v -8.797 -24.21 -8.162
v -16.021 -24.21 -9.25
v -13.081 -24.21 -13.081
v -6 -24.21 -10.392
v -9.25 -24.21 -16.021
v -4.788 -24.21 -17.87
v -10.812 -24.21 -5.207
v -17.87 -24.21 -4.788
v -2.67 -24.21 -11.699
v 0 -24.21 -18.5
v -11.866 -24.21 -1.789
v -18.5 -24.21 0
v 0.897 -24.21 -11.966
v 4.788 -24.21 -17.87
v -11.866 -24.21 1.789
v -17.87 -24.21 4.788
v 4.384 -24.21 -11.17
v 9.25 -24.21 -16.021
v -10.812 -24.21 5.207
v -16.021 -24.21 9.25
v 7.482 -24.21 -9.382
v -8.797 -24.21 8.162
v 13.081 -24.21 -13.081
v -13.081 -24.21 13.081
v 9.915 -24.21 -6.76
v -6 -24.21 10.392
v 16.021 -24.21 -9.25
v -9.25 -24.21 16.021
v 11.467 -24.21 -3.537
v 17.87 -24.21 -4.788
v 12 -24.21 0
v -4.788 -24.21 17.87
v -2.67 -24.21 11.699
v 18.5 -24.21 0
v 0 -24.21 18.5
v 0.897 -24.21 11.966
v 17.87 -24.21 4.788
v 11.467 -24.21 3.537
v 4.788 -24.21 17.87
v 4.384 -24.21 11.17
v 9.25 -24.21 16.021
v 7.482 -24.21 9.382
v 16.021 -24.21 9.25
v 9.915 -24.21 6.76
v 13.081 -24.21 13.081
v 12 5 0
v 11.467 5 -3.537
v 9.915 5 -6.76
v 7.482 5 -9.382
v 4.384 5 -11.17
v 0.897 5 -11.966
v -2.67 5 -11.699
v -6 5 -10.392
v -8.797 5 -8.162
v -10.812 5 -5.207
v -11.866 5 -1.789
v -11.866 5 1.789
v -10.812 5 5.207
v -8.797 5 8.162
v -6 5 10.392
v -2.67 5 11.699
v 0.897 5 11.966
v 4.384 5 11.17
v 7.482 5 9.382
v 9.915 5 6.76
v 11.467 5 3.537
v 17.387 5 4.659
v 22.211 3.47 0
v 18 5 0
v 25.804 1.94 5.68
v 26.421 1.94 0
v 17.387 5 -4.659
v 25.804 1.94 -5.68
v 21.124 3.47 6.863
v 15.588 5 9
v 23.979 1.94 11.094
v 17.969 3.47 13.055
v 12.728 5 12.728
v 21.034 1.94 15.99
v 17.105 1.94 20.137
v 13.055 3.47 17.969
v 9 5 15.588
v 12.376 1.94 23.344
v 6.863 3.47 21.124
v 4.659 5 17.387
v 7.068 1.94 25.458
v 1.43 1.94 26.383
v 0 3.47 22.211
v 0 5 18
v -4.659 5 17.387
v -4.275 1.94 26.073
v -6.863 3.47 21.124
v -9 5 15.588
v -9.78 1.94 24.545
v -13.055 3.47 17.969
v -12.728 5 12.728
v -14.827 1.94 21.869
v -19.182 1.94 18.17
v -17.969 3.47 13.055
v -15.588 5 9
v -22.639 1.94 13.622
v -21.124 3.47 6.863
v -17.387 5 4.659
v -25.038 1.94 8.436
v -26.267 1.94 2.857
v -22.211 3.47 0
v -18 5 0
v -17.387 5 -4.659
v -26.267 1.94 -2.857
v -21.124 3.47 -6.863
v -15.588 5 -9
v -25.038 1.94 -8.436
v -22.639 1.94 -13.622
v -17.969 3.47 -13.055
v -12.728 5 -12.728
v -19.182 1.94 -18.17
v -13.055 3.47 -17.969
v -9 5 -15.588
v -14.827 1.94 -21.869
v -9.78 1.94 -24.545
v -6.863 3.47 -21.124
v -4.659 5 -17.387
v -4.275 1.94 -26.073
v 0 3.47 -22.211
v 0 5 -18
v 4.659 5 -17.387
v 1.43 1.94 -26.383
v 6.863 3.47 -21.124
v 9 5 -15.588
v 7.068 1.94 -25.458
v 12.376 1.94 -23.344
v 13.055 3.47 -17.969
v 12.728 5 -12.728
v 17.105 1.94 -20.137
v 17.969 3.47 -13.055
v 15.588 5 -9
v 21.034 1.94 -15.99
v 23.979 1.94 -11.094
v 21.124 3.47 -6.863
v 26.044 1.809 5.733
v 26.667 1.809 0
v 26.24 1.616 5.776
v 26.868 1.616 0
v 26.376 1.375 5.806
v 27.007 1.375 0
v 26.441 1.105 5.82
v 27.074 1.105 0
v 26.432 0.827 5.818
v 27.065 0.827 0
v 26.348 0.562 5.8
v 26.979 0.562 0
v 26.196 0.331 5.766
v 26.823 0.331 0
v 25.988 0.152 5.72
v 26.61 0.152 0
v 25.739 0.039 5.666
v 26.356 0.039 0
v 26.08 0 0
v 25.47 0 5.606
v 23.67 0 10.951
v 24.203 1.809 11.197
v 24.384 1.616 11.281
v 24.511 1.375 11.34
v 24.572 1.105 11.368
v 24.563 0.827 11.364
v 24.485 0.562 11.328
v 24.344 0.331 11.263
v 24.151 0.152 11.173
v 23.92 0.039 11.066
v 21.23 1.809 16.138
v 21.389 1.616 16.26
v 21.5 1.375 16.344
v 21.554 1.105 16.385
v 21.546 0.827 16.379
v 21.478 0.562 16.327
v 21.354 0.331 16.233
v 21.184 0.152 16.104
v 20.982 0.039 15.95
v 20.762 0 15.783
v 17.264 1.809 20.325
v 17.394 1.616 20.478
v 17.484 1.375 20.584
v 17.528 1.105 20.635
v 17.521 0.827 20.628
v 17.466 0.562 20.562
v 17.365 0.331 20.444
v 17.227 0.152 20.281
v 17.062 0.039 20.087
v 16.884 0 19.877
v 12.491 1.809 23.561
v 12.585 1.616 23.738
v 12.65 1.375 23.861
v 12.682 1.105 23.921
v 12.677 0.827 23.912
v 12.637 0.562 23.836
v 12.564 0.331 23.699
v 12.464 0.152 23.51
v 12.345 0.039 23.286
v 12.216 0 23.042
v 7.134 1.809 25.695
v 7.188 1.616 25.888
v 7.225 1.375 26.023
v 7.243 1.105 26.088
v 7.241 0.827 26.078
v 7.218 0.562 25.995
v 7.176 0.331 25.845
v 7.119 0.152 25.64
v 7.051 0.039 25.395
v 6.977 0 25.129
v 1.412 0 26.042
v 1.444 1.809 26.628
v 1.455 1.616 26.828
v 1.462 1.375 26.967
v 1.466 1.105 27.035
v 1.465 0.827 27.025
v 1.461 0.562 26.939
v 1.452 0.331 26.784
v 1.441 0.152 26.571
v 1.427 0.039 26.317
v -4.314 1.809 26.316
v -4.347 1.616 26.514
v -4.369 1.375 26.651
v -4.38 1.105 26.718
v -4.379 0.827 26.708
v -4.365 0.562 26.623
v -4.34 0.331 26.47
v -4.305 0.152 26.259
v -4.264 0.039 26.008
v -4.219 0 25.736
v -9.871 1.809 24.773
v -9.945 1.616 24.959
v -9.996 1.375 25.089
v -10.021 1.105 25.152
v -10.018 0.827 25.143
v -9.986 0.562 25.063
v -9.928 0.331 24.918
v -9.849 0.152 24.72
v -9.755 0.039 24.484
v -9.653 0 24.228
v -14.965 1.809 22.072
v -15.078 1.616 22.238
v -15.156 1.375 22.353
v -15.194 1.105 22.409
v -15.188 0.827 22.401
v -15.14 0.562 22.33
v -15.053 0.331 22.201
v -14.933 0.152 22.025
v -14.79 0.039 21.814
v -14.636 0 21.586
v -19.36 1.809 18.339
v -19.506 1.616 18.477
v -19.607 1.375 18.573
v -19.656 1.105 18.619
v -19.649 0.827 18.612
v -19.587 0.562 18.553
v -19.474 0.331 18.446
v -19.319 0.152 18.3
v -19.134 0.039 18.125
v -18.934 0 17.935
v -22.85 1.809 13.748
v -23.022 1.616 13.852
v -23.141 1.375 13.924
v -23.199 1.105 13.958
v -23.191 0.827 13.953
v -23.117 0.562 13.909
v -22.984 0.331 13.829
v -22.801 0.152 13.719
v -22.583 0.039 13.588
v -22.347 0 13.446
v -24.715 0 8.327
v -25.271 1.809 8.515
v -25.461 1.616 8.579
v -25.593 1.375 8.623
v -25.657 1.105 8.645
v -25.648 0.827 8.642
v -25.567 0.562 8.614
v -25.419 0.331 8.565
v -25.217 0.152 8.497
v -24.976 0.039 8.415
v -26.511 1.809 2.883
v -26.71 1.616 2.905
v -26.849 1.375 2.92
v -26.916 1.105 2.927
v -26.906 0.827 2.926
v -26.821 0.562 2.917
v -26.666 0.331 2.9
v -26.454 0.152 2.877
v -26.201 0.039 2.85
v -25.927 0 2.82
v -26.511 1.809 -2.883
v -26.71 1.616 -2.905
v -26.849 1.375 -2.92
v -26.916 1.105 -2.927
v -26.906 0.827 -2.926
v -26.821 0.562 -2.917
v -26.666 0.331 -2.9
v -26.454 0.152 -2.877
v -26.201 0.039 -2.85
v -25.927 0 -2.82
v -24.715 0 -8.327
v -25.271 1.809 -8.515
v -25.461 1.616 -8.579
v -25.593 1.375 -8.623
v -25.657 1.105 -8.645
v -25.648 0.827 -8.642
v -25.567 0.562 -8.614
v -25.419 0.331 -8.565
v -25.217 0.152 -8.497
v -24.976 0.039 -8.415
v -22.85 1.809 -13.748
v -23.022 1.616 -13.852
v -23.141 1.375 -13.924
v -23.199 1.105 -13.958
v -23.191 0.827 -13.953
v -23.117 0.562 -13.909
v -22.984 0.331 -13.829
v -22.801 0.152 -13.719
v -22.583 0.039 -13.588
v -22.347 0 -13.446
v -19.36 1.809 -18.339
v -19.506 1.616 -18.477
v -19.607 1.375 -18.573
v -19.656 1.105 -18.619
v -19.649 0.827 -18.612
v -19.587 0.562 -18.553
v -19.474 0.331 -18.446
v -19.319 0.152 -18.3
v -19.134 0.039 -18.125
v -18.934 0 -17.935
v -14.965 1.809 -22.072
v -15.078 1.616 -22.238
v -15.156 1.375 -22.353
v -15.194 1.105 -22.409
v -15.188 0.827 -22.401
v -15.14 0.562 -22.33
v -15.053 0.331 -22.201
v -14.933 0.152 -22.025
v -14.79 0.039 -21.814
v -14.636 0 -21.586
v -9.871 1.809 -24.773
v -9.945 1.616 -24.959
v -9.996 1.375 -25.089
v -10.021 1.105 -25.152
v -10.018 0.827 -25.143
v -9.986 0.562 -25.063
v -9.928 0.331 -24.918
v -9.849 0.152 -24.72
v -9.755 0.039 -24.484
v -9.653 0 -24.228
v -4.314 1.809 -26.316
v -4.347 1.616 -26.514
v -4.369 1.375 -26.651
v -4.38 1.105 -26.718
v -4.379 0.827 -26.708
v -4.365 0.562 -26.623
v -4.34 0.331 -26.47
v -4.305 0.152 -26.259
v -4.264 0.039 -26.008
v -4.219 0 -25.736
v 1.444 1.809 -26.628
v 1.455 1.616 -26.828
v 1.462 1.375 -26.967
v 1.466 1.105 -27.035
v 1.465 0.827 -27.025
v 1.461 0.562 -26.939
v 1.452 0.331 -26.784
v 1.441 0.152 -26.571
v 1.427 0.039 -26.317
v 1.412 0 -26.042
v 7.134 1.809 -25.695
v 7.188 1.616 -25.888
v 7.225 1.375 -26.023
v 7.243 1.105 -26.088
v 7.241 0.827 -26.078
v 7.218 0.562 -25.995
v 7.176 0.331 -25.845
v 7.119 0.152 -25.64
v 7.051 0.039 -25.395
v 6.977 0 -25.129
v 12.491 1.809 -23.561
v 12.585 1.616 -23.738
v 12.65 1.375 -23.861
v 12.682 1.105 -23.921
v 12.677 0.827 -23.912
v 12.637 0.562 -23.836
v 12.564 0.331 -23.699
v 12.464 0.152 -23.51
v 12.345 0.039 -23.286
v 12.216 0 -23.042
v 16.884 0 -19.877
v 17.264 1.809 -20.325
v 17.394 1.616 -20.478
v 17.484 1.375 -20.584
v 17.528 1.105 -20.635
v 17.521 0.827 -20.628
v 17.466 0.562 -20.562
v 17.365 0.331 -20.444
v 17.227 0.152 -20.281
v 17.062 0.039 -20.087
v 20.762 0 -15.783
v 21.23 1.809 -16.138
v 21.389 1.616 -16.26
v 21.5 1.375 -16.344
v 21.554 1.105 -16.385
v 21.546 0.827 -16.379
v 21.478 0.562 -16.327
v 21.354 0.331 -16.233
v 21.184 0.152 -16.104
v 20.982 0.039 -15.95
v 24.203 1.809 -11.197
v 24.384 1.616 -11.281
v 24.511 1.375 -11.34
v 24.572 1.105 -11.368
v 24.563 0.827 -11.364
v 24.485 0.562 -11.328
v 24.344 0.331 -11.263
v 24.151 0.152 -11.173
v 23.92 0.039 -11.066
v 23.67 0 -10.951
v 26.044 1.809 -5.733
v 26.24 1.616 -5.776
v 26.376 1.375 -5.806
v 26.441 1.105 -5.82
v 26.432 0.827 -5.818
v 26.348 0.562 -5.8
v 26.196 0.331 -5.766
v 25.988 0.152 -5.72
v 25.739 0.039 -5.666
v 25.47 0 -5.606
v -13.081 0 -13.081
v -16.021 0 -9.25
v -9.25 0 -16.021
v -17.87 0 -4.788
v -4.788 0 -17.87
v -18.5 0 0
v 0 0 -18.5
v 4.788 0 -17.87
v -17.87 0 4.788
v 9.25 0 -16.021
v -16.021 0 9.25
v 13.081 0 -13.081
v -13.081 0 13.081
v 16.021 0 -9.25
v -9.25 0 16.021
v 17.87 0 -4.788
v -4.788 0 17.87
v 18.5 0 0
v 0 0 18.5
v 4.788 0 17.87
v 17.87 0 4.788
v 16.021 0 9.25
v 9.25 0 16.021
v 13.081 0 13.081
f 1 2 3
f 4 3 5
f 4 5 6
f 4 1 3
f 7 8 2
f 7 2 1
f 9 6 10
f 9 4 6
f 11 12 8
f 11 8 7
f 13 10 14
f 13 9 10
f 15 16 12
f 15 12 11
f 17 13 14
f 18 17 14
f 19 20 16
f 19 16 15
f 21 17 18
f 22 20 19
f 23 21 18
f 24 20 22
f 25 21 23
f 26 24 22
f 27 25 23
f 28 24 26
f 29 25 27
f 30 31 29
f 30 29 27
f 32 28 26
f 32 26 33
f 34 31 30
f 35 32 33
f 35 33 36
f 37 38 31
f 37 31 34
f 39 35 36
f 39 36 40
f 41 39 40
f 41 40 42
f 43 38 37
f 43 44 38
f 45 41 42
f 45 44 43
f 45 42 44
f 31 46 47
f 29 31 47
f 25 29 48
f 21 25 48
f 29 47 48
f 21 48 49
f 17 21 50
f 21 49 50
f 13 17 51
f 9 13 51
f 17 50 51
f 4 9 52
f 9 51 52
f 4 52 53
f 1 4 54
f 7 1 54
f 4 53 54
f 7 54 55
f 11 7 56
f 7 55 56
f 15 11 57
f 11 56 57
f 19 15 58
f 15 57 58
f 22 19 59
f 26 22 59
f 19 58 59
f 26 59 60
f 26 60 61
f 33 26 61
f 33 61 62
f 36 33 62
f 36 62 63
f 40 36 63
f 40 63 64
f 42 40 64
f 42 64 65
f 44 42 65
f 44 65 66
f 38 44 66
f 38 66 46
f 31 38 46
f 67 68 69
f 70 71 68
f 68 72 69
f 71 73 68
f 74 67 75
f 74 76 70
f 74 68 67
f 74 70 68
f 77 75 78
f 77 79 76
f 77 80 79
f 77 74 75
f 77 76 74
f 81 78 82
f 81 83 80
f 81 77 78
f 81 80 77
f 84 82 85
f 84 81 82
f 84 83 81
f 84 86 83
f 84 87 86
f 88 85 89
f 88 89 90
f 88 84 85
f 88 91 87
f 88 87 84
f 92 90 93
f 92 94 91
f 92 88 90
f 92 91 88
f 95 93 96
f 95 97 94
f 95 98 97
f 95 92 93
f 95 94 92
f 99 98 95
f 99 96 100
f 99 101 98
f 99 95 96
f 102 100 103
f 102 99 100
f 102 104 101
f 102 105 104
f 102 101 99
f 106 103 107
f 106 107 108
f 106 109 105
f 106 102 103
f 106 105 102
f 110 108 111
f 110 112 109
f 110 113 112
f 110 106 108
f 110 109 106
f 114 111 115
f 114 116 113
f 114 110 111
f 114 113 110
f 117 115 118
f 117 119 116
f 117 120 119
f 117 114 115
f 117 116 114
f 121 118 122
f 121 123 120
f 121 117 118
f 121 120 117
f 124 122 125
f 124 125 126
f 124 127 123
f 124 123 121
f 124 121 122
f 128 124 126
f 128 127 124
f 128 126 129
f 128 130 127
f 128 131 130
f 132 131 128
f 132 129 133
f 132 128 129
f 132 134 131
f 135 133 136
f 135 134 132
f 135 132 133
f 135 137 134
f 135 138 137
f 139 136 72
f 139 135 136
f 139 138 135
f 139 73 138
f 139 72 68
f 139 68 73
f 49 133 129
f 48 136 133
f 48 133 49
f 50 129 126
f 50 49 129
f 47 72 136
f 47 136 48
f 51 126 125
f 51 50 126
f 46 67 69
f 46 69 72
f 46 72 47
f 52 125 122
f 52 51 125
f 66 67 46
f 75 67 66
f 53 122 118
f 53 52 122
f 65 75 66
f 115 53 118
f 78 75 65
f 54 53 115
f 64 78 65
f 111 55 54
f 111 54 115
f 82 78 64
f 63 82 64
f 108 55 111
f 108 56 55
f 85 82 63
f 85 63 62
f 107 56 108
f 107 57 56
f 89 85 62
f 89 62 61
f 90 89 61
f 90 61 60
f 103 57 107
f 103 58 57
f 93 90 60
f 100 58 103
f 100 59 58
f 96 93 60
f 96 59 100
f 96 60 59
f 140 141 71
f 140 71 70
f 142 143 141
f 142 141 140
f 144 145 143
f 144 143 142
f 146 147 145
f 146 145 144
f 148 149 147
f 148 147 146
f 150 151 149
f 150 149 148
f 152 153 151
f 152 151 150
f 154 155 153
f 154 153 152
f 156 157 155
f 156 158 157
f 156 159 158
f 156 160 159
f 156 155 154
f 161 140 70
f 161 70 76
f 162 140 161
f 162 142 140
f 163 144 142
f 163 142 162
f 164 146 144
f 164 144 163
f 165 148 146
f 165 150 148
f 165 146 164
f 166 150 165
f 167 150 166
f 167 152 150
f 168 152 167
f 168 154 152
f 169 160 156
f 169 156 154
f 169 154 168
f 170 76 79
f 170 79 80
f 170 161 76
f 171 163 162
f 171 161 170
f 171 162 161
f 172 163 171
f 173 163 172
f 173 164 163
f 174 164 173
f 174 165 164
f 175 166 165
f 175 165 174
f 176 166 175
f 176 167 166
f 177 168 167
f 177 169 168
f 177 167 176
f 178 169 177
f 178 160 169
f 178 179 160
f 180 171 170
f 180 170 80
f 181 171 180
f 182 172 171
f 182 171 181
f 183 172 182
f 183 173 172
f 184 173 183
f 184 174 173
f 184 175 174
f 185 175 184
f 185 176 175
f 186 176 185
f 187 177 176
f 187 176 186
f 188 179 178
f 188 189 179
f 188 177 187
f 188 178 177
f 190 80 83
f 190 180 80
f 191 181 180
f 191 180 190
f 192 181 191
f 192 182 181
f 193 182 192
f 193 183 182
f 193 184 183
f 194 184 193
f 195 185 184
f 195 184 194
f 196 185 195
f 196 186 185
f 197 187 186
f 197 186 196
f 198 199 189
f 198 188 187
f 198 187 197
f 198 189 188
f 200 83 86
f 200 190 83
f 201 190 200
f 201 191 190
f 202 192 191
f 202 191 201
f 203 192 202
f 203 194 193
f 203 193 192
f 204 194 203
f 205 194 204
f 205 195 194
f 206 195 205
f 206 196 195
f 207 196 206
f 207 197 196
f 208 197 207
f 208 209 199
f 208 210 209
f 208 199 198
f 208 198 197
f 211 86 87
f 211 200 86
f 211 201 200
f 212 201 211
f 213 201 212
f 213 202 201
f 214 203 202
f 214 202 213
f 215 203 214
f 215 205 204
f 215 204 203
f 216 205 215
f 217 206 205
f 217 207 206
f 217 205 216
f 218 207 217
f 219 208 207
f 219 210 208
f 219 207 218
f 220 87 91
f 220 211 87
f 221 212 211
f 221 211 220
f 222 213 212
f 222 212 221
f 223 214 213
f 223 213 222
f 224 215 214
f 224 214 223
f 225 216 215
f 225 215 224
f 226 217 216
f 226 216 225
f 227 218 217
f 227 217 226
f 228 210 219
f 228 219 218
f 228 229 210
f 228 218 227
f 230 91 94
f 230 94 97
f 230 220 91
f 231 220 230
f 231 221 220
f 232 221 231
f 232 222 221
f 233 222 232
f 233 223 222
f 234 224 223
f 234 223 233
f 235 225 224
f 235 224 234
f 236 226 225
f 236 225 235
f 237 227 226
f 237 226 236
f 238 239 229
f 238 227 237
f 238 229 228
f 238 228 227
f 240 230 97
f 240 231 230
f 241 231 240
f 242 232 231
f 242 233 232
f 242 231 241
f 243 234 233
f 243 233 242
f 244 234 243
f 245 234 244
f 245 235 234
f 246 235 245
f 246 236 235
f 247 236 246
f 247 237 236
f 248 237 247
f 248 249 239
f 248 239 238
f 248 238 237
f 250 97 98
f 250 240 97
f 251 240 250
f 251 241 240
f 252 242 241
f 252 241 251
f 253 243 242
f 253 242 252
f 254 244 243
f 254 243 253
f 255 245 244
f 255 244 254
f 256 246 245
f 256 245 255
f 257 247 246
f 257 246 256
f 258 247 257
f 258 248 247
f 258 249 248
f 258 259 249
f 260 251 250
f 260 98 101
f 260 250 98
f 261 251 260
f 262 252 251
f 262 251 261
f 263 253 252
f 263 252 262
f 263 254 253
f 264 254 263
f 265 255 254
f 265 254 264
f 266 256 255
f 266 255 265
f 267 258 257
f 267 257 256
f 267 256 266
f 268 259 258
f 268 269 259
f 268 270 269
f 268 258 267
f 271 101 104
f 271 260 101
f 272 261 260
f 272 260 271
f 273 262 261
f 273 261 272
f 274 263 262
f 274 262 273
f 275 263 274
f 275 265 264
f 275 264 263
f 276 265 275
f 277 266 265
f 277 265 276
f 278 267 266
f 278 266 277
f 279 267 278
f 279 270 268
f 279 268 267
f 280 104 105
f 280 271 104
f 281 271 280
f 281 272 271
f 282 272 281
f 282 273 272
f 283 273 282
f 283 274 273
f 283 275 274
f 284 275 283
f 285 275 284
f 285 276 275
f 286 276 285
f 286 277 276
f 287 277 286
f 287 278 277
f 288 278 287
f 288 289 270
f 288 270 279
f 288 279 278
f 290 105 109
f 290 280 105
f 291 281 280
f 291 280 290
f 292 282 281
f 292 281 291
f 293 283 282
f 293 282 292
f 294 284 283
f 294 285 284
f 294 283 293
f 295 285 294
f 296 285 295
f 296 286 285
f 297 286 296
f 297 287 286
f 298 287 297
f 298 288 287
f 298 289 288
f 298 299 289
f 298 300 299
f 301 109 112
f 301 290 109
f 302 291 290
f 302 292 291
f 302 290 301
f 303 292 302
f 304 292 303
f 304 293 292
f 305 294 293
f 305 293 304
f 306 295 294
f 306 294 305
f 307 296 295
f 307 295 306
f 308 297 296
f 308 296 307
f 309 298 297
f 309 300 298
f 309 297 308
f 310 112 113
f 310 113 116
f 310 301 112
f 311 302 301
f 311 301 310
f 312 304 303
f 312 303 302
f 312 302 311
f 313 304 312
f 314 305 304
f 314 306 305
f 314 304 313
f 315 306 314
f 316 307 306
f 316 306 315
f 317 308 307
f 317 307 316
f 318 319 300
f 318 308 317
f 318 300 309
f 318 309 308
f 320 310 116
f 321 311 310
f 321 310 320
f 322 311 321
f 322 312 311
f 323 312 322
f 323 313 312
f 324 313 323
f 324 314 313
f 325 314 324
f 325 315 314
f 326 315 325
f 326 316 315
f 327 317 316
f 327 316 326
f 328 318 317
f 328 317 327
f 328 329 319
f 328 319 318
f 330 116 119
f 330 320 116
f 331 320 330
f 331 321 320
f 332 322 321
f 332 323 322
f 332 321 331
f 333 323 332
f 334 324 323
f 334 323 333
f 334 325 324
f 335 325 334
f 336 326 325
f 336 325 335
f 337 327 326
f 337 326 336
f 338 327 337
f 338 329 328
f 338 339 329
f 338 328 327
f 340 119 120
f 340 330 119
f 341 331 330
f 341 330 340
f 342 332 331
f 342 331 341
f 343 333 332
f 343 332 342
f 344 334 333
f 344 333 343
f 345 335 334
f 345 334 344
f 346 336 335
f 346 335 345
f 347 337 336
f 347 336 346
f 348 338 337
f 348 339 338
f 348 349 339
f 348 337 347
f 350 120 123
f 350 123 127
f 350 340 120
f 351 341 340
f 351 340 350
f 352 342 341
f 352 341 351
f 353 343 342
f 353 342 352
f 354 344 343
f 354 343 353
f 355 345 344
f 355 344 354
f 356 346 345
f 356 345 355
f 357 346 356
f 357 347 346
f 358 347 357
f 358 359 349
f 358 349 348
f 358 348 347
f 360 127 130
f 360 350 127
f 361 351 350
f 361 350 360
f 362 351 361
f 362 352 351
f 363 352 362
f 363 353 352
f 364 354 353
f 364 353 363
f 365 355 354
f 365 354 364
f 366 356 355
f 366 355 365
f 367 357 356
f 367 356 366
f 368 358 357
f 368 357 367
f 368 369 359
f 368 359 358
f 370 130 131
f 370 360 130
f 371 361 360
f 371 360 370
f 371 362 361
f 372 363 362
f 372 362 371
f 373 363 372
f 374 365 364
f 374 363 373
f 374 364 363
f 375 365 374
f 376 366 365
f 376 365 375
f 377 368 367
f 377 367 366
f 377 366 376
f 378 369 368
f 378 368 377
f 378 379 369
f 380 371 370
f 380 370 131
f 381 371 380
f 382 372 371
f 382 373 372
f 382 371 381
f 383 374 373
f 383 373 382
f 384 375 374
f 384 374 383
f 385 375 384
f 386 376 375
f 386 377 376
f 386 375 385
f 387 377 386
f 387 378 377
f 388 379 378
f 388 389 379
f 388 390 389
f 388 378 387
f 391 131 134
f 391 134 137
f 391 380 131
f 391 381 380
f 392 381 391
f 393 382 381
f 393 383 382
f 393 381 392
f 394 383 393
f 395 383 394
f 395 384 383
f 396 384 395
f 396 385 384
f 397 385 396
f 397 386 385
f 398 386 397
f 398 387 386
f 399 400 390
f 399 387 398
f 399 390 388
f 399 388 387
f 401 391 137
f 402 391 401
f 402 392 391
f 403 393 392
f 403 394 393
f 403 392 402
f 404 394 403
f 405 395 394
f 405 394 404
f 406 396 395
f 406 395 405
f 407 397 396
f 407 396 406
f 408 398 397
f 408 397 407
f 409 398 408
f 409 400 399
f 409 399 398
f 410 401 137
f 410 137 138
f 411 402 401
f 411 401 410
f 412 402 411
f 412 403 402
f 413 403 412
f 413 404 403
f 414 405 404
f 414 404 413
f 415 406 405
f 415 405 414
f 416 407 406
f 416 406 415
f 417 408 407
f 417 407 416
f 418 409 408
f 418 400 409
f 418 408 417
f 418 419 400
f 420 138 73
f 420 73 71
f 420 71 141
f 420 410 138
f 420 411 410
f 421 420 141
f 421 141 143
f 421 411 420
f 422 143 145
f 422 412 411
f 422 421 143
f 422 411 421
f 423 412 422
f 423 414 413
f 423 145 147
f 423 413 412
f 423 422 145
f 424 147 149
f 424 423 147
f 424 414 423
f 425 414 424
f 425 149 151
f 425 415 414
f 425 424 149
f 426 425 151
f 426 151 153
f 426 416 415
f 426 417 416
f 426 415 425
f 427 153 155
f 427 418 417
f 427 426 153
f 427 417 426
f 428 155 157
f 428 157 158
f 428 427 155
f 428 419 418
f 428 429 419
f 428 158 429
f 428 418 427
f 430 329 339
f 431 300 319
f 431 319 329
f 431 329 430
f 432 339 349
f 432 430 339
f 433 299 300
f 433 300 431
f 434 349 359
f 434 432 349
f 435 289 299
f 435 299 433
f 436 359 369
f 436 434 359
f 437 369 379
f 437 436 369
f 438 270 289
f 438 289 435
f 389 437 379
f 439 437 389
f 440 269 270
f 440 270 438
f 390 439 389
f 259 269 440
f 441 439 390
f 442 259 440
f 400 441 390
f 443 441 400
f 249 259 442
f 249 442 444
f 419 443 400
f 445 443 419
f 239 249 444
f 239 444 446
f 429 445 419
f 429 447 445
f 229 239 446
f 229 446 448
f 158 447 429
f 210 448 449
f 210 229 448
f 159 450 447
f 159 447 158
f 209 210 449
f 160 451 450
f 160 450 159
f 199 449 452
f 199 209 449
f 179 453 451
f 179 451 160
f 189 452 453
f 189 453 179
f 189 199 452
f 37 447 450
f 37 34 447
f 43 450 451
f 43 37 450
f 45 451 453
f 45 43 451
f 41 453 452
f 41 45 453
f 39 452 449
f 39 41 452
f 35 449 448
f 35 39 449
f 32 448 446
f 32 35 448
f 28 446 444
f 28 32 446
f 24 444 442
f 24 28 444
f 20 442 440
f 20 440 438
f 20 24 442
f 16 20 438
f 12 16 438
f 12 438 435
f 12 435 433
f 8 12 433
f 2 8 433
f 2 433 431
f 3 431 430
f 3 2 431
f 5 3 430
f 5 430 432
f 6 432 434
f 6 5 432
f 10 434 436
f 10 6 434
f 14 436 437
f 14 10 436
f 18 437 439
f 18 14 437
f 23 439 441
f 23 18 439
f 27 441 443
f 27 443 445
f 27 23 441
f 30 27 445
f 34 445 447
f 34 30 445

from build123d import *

# Parameters (mm, degrees)
CUT_EXTRUDE1_REACH = 31.21
SKETCH2_R          = 12
FILLET1_R          = 1


with BuildPart() as part:
    # Sketch1 → Revolve1 (revolve)
    with BuildSketch(Plane.XY):
        Polygon((0, 5), (18, 5), (31.76, 0), (18.5, 0), (18.5, -24.21), (0, -24.21), align=None)
    revolve(axis=Axis((0, 25.060687023, 0), (0, -1, 0)))

    # Sketch2 → Cut-Extrude1 (cut, up to next)
    with BuildSketch(Plane(origin=(0, 5, 0), x_dir=(1, 0, 0), z_dir=(0, 1, 0)), mode=Mode.PRIVATE) as cut_extrude1_sk1:
        Circle(SKETCH2_R)
    cut_extrude1_tool1 = extrude(cut_extrude1_sk1.sketch, amount=-CUT_EXTRUDE1_REACH, mode=Mode.PRIVATE) & part.part
    add(cut_extrude1_tool1.solids().sort_by_distance((0, 5, 0))[0], mode=Mode.SUBTRACT)

    # Fillet1
    fillet1_edges = [part.edges().sort_by_distance(p)[0] for p in [
        (-31.76, 0, 0),
    ]]
    fillet(fillet1_edges, radius=FILLET1_R)


solid = part.part
